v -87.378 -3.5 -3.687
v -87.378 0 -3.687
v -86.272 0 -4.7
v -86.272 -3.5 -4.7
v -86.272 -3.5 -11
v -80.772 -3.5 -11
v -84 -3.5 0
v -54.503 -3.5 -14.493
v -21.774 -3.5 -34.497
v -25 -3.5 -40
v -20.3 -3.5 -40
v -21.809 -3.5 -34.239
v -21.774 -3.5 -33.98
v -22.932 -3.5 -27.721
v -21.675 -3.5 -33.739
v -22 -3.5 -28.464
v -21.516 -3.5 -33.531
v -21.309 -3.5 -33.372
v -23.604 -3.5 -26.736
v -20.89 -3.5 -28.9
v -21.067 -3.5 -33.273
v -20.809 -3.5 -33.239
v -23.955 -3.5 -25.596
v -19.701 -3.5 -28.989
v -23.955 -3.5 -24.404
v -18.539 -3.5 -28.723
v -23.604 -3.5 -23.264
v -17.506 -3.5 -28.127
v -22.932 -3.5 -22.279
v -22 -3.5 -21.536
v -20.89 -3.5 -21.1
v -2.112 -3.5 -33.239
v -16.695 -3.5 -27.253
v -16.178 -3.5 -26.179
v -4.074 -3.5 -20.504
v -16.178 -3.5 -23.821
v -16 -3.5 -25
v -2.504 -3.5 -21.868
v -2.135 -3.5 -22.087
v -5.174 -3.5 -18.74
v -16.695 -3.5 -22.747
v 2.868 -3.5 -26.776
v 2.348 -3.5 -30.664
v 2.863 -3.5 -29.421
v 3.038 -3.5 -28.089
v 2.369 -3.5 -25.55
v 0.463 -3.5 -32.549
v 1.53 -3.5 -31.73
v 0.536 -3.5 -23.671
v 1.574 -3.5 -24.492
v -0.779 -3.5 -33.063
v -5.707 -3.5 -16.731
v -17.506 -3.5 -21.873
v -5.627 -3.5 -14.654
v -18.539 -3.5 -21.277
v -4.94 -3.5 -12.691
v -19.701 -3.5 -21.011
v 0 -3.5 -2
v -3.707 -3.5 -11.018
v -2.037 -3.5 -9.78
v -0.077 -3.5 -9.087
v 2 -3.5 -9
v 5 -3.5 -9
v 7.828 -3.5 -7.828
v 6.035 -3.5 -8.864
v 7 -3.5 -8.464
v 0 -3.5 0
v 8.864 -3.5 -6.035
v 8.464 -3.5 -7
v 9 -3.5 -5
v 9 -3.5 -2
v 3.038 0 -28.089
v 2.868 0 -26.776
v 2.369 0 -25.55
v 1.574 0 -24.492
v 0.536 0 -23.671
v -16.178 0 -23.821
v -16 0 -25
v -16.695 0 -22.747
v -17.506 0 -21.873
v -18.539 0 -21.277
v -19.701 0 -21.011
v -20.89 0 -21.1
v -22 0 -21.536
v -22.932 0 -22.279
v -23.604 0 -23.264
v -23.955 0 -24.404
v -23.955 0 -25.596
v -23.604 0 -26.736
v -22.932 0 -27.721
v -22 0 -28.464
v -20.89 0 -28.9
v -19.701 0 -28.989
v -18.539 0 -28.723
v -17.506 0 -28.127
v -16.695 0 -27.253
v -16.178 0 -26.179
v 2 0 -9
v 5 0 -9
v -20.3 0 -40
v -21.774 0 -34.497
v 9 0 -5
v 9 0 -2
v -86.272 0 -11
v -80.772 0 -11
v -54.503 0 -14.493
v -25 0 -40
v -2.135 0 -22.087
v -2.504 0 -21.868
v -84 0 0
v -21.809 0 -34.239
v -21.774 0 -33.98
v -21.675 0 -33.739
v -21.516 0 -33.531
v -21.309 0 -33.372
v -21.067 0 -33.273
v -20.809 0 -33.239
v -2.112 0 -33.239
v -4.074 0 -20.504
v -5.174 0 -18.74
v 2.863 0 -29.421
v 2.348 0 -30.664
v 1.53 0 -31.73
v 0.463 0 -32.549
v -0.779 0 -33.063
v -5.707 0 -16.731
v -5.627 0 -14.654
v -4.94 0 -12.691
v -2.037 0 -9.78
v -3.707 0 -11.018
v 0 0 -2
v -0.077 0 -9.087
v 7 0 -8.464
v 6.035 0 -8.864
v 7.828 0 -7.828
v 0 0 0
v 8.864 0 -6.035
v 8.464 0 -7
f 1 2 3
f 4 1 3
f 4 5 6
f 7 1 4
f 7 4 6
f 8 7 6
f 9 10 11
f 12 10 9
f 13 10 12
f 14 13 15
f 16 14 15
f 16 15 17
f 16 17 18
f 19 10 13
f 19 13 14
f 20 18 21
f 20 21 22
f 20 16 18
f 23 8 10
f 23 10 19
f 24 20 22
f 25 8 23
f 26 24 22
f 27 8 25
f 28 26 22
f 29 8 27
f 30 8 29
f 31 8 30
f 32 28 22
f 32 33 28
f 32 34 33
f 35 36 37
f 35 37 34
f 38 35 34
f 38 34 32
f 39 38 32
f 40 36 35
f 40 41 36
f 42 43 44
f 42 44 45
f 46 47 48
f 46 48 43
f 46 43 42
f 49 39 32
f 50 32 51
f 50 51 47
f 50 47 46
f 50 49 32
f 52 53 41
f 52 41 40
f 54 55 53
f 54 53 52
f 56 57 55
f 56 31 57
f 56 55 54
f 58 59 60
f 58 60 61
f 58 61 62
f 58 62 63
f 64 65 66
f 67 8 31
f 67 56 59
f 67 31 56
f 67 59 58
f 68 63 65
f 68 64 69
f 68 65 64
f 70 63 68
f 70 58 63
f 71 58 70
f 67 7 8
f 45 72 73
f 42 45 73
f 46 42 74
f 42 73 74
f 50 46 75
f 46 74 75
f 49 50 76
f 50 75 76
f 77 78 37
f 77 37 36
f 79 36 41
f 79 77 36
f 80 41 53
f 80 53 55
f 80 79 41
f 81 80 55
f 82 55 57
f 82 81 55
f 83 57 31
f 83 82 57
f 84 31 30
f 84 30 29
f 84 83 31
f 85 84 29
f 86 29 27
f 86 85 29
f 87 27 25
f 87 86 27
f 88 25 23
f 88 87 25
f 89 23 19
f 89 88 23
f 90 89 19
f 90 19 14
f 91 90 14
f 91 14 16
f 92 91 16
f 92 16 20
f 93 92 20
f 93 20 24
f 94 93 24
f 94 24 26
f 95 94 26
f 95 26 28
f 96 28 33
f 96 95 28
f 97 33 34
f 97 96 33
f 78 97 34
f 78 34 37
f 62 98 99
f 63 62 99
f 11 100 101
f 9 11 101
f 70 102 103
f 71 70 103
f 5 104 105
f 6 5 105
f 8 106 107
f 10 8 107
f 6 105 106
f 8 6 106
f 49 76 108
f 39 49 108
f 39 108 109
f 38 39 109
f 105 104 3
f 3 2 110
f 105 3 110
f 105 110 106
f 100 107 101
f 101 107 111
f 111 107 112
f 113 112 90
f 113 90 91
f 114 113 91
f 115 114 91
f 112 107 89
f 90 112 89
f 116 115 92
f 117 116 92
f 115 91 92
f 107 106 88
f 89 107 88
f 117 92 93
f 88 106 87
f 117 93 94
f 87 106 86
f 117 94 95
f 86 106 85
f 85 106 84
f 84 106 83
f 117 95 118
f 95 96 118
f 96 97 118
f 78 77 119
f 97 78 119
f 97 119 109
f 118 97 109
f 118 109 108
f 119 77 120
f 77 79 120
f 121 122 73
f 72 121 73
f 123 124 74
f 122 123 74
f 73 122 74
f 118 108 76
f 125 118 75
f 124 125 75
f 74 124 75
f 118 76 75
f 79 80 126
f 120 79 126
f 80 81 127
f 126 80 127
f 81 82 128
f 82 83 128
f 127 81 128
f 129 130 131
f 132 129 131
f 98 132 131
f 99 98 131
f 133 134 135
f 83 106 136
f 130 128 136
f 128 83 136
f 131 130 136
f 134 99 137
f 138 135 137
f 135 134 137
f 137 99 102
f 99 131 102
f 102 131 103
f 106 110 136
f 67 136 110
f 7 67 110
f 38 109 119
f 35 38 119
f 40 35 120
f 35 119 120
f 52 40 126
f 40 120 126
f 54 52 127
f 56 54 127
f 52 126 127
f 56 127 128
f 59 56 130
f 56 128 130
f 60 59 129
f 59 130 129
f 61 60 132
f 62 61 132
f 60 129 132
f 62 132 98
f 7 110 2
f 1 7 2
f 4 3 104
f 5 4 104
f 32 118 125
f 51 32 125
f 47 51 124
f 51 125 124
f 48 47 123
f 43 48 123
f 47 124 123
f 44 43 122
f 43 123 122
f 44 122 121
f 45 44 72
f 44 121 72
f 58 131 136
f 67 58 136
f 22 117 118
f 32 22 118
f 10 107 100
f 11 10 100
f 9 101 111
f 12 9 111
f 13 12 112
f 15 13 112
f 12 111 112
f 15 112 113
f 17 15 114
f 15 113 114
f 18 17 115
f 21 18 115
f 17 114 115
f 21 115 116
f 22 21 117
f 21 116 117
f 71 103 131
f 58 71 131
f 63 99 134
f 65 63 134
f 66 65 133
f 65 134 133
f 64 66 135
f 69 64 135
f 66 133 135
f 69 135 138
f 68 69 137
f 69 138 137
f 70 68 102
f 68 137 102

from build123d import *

# Parameters (mm, degrees)
F0_R     = 4
F1_DEPTH = 3.5


with BuildPart() as f1:
    # F0 (on Front) → F1 (new body)
    with BuildSketch(Plane.XZ):
        with BuildLine():
            Line((0, -2), (0, 0))
            Line((0, 0), (-84, 0))
            Line((-84, 0), (-87.3775810443, -3.6867256867))
            Line((-87.3775810443, -3.6867256867), (-86.2715633383, -4.7))
            Line((-86.2715633383, -4.7), (-86.2715633383, -11))
            Line((-86.2715633383, -11), (-80.7715633383, -11))
            Line((-80.7715633383, -11), (-54.5028455385, -14.493488966))
            Line((-54.5028455385, -14.493488966), (-25, -40))
            Line((-25, -40), (-20.3, -40))
            Line((-20.3, -40), (-21.7744337692, -34.4973382611))
            ThreePointArc((-21.7744337692, -34.4973382611), (-21.6018612832, -33.629757787), (-20.8085079429, -33.238519216))
            Line((-20.8085079429, -33.238519216), (-2.1117333157, -33.238519216))
            ThreePointArc((-2.1117333157, -33.238519216), (1.5298666074, -31.7301191391), (3.0382666843, -28.088519216))
            ThreePointArc((3.0382666843, -28.088519216), (2.3691920714, -25.5500536017), (0.5358171017, -23.6711696954))
            Line((0.5358171017, -23.6711696954), (-2.1348951645, -22.0868976918))
            ThreePointArc((-2.1348951645, -22.0868976918), (-2.3213319674, -21.9801363334), (-2.5044046725, -21.8677038925))
            ThreePointArc((-2.5044046725, -21.8677038925), (-5.3568950896, -13.6469284918), (2, -9))
            Line((2, -9), (5, -9))
            ThreePointArc((5, -9), (7.8284271247, -7.8284271247), (9, -5))
            Line((9, -5), (9, -2))
            Line((9, -2), (0, -2))
        make_face()
        with Locations((-20, -25)):
            Circle(F0_R, mode=Mode.SUBTRACT)
        with BuildLine():
            Line((-2.1348951645, -22.0868976918), (-2.5044046725, -21.8677038925))
            ThreePointArc((-2.5044046725, -21.8677038925), (-2.3213319674, -21.9801363334), (-2.1348951645, -22.0868976918))
        make_face()
    extrude(amount=F1_DEPTH)


solid = f1.part
